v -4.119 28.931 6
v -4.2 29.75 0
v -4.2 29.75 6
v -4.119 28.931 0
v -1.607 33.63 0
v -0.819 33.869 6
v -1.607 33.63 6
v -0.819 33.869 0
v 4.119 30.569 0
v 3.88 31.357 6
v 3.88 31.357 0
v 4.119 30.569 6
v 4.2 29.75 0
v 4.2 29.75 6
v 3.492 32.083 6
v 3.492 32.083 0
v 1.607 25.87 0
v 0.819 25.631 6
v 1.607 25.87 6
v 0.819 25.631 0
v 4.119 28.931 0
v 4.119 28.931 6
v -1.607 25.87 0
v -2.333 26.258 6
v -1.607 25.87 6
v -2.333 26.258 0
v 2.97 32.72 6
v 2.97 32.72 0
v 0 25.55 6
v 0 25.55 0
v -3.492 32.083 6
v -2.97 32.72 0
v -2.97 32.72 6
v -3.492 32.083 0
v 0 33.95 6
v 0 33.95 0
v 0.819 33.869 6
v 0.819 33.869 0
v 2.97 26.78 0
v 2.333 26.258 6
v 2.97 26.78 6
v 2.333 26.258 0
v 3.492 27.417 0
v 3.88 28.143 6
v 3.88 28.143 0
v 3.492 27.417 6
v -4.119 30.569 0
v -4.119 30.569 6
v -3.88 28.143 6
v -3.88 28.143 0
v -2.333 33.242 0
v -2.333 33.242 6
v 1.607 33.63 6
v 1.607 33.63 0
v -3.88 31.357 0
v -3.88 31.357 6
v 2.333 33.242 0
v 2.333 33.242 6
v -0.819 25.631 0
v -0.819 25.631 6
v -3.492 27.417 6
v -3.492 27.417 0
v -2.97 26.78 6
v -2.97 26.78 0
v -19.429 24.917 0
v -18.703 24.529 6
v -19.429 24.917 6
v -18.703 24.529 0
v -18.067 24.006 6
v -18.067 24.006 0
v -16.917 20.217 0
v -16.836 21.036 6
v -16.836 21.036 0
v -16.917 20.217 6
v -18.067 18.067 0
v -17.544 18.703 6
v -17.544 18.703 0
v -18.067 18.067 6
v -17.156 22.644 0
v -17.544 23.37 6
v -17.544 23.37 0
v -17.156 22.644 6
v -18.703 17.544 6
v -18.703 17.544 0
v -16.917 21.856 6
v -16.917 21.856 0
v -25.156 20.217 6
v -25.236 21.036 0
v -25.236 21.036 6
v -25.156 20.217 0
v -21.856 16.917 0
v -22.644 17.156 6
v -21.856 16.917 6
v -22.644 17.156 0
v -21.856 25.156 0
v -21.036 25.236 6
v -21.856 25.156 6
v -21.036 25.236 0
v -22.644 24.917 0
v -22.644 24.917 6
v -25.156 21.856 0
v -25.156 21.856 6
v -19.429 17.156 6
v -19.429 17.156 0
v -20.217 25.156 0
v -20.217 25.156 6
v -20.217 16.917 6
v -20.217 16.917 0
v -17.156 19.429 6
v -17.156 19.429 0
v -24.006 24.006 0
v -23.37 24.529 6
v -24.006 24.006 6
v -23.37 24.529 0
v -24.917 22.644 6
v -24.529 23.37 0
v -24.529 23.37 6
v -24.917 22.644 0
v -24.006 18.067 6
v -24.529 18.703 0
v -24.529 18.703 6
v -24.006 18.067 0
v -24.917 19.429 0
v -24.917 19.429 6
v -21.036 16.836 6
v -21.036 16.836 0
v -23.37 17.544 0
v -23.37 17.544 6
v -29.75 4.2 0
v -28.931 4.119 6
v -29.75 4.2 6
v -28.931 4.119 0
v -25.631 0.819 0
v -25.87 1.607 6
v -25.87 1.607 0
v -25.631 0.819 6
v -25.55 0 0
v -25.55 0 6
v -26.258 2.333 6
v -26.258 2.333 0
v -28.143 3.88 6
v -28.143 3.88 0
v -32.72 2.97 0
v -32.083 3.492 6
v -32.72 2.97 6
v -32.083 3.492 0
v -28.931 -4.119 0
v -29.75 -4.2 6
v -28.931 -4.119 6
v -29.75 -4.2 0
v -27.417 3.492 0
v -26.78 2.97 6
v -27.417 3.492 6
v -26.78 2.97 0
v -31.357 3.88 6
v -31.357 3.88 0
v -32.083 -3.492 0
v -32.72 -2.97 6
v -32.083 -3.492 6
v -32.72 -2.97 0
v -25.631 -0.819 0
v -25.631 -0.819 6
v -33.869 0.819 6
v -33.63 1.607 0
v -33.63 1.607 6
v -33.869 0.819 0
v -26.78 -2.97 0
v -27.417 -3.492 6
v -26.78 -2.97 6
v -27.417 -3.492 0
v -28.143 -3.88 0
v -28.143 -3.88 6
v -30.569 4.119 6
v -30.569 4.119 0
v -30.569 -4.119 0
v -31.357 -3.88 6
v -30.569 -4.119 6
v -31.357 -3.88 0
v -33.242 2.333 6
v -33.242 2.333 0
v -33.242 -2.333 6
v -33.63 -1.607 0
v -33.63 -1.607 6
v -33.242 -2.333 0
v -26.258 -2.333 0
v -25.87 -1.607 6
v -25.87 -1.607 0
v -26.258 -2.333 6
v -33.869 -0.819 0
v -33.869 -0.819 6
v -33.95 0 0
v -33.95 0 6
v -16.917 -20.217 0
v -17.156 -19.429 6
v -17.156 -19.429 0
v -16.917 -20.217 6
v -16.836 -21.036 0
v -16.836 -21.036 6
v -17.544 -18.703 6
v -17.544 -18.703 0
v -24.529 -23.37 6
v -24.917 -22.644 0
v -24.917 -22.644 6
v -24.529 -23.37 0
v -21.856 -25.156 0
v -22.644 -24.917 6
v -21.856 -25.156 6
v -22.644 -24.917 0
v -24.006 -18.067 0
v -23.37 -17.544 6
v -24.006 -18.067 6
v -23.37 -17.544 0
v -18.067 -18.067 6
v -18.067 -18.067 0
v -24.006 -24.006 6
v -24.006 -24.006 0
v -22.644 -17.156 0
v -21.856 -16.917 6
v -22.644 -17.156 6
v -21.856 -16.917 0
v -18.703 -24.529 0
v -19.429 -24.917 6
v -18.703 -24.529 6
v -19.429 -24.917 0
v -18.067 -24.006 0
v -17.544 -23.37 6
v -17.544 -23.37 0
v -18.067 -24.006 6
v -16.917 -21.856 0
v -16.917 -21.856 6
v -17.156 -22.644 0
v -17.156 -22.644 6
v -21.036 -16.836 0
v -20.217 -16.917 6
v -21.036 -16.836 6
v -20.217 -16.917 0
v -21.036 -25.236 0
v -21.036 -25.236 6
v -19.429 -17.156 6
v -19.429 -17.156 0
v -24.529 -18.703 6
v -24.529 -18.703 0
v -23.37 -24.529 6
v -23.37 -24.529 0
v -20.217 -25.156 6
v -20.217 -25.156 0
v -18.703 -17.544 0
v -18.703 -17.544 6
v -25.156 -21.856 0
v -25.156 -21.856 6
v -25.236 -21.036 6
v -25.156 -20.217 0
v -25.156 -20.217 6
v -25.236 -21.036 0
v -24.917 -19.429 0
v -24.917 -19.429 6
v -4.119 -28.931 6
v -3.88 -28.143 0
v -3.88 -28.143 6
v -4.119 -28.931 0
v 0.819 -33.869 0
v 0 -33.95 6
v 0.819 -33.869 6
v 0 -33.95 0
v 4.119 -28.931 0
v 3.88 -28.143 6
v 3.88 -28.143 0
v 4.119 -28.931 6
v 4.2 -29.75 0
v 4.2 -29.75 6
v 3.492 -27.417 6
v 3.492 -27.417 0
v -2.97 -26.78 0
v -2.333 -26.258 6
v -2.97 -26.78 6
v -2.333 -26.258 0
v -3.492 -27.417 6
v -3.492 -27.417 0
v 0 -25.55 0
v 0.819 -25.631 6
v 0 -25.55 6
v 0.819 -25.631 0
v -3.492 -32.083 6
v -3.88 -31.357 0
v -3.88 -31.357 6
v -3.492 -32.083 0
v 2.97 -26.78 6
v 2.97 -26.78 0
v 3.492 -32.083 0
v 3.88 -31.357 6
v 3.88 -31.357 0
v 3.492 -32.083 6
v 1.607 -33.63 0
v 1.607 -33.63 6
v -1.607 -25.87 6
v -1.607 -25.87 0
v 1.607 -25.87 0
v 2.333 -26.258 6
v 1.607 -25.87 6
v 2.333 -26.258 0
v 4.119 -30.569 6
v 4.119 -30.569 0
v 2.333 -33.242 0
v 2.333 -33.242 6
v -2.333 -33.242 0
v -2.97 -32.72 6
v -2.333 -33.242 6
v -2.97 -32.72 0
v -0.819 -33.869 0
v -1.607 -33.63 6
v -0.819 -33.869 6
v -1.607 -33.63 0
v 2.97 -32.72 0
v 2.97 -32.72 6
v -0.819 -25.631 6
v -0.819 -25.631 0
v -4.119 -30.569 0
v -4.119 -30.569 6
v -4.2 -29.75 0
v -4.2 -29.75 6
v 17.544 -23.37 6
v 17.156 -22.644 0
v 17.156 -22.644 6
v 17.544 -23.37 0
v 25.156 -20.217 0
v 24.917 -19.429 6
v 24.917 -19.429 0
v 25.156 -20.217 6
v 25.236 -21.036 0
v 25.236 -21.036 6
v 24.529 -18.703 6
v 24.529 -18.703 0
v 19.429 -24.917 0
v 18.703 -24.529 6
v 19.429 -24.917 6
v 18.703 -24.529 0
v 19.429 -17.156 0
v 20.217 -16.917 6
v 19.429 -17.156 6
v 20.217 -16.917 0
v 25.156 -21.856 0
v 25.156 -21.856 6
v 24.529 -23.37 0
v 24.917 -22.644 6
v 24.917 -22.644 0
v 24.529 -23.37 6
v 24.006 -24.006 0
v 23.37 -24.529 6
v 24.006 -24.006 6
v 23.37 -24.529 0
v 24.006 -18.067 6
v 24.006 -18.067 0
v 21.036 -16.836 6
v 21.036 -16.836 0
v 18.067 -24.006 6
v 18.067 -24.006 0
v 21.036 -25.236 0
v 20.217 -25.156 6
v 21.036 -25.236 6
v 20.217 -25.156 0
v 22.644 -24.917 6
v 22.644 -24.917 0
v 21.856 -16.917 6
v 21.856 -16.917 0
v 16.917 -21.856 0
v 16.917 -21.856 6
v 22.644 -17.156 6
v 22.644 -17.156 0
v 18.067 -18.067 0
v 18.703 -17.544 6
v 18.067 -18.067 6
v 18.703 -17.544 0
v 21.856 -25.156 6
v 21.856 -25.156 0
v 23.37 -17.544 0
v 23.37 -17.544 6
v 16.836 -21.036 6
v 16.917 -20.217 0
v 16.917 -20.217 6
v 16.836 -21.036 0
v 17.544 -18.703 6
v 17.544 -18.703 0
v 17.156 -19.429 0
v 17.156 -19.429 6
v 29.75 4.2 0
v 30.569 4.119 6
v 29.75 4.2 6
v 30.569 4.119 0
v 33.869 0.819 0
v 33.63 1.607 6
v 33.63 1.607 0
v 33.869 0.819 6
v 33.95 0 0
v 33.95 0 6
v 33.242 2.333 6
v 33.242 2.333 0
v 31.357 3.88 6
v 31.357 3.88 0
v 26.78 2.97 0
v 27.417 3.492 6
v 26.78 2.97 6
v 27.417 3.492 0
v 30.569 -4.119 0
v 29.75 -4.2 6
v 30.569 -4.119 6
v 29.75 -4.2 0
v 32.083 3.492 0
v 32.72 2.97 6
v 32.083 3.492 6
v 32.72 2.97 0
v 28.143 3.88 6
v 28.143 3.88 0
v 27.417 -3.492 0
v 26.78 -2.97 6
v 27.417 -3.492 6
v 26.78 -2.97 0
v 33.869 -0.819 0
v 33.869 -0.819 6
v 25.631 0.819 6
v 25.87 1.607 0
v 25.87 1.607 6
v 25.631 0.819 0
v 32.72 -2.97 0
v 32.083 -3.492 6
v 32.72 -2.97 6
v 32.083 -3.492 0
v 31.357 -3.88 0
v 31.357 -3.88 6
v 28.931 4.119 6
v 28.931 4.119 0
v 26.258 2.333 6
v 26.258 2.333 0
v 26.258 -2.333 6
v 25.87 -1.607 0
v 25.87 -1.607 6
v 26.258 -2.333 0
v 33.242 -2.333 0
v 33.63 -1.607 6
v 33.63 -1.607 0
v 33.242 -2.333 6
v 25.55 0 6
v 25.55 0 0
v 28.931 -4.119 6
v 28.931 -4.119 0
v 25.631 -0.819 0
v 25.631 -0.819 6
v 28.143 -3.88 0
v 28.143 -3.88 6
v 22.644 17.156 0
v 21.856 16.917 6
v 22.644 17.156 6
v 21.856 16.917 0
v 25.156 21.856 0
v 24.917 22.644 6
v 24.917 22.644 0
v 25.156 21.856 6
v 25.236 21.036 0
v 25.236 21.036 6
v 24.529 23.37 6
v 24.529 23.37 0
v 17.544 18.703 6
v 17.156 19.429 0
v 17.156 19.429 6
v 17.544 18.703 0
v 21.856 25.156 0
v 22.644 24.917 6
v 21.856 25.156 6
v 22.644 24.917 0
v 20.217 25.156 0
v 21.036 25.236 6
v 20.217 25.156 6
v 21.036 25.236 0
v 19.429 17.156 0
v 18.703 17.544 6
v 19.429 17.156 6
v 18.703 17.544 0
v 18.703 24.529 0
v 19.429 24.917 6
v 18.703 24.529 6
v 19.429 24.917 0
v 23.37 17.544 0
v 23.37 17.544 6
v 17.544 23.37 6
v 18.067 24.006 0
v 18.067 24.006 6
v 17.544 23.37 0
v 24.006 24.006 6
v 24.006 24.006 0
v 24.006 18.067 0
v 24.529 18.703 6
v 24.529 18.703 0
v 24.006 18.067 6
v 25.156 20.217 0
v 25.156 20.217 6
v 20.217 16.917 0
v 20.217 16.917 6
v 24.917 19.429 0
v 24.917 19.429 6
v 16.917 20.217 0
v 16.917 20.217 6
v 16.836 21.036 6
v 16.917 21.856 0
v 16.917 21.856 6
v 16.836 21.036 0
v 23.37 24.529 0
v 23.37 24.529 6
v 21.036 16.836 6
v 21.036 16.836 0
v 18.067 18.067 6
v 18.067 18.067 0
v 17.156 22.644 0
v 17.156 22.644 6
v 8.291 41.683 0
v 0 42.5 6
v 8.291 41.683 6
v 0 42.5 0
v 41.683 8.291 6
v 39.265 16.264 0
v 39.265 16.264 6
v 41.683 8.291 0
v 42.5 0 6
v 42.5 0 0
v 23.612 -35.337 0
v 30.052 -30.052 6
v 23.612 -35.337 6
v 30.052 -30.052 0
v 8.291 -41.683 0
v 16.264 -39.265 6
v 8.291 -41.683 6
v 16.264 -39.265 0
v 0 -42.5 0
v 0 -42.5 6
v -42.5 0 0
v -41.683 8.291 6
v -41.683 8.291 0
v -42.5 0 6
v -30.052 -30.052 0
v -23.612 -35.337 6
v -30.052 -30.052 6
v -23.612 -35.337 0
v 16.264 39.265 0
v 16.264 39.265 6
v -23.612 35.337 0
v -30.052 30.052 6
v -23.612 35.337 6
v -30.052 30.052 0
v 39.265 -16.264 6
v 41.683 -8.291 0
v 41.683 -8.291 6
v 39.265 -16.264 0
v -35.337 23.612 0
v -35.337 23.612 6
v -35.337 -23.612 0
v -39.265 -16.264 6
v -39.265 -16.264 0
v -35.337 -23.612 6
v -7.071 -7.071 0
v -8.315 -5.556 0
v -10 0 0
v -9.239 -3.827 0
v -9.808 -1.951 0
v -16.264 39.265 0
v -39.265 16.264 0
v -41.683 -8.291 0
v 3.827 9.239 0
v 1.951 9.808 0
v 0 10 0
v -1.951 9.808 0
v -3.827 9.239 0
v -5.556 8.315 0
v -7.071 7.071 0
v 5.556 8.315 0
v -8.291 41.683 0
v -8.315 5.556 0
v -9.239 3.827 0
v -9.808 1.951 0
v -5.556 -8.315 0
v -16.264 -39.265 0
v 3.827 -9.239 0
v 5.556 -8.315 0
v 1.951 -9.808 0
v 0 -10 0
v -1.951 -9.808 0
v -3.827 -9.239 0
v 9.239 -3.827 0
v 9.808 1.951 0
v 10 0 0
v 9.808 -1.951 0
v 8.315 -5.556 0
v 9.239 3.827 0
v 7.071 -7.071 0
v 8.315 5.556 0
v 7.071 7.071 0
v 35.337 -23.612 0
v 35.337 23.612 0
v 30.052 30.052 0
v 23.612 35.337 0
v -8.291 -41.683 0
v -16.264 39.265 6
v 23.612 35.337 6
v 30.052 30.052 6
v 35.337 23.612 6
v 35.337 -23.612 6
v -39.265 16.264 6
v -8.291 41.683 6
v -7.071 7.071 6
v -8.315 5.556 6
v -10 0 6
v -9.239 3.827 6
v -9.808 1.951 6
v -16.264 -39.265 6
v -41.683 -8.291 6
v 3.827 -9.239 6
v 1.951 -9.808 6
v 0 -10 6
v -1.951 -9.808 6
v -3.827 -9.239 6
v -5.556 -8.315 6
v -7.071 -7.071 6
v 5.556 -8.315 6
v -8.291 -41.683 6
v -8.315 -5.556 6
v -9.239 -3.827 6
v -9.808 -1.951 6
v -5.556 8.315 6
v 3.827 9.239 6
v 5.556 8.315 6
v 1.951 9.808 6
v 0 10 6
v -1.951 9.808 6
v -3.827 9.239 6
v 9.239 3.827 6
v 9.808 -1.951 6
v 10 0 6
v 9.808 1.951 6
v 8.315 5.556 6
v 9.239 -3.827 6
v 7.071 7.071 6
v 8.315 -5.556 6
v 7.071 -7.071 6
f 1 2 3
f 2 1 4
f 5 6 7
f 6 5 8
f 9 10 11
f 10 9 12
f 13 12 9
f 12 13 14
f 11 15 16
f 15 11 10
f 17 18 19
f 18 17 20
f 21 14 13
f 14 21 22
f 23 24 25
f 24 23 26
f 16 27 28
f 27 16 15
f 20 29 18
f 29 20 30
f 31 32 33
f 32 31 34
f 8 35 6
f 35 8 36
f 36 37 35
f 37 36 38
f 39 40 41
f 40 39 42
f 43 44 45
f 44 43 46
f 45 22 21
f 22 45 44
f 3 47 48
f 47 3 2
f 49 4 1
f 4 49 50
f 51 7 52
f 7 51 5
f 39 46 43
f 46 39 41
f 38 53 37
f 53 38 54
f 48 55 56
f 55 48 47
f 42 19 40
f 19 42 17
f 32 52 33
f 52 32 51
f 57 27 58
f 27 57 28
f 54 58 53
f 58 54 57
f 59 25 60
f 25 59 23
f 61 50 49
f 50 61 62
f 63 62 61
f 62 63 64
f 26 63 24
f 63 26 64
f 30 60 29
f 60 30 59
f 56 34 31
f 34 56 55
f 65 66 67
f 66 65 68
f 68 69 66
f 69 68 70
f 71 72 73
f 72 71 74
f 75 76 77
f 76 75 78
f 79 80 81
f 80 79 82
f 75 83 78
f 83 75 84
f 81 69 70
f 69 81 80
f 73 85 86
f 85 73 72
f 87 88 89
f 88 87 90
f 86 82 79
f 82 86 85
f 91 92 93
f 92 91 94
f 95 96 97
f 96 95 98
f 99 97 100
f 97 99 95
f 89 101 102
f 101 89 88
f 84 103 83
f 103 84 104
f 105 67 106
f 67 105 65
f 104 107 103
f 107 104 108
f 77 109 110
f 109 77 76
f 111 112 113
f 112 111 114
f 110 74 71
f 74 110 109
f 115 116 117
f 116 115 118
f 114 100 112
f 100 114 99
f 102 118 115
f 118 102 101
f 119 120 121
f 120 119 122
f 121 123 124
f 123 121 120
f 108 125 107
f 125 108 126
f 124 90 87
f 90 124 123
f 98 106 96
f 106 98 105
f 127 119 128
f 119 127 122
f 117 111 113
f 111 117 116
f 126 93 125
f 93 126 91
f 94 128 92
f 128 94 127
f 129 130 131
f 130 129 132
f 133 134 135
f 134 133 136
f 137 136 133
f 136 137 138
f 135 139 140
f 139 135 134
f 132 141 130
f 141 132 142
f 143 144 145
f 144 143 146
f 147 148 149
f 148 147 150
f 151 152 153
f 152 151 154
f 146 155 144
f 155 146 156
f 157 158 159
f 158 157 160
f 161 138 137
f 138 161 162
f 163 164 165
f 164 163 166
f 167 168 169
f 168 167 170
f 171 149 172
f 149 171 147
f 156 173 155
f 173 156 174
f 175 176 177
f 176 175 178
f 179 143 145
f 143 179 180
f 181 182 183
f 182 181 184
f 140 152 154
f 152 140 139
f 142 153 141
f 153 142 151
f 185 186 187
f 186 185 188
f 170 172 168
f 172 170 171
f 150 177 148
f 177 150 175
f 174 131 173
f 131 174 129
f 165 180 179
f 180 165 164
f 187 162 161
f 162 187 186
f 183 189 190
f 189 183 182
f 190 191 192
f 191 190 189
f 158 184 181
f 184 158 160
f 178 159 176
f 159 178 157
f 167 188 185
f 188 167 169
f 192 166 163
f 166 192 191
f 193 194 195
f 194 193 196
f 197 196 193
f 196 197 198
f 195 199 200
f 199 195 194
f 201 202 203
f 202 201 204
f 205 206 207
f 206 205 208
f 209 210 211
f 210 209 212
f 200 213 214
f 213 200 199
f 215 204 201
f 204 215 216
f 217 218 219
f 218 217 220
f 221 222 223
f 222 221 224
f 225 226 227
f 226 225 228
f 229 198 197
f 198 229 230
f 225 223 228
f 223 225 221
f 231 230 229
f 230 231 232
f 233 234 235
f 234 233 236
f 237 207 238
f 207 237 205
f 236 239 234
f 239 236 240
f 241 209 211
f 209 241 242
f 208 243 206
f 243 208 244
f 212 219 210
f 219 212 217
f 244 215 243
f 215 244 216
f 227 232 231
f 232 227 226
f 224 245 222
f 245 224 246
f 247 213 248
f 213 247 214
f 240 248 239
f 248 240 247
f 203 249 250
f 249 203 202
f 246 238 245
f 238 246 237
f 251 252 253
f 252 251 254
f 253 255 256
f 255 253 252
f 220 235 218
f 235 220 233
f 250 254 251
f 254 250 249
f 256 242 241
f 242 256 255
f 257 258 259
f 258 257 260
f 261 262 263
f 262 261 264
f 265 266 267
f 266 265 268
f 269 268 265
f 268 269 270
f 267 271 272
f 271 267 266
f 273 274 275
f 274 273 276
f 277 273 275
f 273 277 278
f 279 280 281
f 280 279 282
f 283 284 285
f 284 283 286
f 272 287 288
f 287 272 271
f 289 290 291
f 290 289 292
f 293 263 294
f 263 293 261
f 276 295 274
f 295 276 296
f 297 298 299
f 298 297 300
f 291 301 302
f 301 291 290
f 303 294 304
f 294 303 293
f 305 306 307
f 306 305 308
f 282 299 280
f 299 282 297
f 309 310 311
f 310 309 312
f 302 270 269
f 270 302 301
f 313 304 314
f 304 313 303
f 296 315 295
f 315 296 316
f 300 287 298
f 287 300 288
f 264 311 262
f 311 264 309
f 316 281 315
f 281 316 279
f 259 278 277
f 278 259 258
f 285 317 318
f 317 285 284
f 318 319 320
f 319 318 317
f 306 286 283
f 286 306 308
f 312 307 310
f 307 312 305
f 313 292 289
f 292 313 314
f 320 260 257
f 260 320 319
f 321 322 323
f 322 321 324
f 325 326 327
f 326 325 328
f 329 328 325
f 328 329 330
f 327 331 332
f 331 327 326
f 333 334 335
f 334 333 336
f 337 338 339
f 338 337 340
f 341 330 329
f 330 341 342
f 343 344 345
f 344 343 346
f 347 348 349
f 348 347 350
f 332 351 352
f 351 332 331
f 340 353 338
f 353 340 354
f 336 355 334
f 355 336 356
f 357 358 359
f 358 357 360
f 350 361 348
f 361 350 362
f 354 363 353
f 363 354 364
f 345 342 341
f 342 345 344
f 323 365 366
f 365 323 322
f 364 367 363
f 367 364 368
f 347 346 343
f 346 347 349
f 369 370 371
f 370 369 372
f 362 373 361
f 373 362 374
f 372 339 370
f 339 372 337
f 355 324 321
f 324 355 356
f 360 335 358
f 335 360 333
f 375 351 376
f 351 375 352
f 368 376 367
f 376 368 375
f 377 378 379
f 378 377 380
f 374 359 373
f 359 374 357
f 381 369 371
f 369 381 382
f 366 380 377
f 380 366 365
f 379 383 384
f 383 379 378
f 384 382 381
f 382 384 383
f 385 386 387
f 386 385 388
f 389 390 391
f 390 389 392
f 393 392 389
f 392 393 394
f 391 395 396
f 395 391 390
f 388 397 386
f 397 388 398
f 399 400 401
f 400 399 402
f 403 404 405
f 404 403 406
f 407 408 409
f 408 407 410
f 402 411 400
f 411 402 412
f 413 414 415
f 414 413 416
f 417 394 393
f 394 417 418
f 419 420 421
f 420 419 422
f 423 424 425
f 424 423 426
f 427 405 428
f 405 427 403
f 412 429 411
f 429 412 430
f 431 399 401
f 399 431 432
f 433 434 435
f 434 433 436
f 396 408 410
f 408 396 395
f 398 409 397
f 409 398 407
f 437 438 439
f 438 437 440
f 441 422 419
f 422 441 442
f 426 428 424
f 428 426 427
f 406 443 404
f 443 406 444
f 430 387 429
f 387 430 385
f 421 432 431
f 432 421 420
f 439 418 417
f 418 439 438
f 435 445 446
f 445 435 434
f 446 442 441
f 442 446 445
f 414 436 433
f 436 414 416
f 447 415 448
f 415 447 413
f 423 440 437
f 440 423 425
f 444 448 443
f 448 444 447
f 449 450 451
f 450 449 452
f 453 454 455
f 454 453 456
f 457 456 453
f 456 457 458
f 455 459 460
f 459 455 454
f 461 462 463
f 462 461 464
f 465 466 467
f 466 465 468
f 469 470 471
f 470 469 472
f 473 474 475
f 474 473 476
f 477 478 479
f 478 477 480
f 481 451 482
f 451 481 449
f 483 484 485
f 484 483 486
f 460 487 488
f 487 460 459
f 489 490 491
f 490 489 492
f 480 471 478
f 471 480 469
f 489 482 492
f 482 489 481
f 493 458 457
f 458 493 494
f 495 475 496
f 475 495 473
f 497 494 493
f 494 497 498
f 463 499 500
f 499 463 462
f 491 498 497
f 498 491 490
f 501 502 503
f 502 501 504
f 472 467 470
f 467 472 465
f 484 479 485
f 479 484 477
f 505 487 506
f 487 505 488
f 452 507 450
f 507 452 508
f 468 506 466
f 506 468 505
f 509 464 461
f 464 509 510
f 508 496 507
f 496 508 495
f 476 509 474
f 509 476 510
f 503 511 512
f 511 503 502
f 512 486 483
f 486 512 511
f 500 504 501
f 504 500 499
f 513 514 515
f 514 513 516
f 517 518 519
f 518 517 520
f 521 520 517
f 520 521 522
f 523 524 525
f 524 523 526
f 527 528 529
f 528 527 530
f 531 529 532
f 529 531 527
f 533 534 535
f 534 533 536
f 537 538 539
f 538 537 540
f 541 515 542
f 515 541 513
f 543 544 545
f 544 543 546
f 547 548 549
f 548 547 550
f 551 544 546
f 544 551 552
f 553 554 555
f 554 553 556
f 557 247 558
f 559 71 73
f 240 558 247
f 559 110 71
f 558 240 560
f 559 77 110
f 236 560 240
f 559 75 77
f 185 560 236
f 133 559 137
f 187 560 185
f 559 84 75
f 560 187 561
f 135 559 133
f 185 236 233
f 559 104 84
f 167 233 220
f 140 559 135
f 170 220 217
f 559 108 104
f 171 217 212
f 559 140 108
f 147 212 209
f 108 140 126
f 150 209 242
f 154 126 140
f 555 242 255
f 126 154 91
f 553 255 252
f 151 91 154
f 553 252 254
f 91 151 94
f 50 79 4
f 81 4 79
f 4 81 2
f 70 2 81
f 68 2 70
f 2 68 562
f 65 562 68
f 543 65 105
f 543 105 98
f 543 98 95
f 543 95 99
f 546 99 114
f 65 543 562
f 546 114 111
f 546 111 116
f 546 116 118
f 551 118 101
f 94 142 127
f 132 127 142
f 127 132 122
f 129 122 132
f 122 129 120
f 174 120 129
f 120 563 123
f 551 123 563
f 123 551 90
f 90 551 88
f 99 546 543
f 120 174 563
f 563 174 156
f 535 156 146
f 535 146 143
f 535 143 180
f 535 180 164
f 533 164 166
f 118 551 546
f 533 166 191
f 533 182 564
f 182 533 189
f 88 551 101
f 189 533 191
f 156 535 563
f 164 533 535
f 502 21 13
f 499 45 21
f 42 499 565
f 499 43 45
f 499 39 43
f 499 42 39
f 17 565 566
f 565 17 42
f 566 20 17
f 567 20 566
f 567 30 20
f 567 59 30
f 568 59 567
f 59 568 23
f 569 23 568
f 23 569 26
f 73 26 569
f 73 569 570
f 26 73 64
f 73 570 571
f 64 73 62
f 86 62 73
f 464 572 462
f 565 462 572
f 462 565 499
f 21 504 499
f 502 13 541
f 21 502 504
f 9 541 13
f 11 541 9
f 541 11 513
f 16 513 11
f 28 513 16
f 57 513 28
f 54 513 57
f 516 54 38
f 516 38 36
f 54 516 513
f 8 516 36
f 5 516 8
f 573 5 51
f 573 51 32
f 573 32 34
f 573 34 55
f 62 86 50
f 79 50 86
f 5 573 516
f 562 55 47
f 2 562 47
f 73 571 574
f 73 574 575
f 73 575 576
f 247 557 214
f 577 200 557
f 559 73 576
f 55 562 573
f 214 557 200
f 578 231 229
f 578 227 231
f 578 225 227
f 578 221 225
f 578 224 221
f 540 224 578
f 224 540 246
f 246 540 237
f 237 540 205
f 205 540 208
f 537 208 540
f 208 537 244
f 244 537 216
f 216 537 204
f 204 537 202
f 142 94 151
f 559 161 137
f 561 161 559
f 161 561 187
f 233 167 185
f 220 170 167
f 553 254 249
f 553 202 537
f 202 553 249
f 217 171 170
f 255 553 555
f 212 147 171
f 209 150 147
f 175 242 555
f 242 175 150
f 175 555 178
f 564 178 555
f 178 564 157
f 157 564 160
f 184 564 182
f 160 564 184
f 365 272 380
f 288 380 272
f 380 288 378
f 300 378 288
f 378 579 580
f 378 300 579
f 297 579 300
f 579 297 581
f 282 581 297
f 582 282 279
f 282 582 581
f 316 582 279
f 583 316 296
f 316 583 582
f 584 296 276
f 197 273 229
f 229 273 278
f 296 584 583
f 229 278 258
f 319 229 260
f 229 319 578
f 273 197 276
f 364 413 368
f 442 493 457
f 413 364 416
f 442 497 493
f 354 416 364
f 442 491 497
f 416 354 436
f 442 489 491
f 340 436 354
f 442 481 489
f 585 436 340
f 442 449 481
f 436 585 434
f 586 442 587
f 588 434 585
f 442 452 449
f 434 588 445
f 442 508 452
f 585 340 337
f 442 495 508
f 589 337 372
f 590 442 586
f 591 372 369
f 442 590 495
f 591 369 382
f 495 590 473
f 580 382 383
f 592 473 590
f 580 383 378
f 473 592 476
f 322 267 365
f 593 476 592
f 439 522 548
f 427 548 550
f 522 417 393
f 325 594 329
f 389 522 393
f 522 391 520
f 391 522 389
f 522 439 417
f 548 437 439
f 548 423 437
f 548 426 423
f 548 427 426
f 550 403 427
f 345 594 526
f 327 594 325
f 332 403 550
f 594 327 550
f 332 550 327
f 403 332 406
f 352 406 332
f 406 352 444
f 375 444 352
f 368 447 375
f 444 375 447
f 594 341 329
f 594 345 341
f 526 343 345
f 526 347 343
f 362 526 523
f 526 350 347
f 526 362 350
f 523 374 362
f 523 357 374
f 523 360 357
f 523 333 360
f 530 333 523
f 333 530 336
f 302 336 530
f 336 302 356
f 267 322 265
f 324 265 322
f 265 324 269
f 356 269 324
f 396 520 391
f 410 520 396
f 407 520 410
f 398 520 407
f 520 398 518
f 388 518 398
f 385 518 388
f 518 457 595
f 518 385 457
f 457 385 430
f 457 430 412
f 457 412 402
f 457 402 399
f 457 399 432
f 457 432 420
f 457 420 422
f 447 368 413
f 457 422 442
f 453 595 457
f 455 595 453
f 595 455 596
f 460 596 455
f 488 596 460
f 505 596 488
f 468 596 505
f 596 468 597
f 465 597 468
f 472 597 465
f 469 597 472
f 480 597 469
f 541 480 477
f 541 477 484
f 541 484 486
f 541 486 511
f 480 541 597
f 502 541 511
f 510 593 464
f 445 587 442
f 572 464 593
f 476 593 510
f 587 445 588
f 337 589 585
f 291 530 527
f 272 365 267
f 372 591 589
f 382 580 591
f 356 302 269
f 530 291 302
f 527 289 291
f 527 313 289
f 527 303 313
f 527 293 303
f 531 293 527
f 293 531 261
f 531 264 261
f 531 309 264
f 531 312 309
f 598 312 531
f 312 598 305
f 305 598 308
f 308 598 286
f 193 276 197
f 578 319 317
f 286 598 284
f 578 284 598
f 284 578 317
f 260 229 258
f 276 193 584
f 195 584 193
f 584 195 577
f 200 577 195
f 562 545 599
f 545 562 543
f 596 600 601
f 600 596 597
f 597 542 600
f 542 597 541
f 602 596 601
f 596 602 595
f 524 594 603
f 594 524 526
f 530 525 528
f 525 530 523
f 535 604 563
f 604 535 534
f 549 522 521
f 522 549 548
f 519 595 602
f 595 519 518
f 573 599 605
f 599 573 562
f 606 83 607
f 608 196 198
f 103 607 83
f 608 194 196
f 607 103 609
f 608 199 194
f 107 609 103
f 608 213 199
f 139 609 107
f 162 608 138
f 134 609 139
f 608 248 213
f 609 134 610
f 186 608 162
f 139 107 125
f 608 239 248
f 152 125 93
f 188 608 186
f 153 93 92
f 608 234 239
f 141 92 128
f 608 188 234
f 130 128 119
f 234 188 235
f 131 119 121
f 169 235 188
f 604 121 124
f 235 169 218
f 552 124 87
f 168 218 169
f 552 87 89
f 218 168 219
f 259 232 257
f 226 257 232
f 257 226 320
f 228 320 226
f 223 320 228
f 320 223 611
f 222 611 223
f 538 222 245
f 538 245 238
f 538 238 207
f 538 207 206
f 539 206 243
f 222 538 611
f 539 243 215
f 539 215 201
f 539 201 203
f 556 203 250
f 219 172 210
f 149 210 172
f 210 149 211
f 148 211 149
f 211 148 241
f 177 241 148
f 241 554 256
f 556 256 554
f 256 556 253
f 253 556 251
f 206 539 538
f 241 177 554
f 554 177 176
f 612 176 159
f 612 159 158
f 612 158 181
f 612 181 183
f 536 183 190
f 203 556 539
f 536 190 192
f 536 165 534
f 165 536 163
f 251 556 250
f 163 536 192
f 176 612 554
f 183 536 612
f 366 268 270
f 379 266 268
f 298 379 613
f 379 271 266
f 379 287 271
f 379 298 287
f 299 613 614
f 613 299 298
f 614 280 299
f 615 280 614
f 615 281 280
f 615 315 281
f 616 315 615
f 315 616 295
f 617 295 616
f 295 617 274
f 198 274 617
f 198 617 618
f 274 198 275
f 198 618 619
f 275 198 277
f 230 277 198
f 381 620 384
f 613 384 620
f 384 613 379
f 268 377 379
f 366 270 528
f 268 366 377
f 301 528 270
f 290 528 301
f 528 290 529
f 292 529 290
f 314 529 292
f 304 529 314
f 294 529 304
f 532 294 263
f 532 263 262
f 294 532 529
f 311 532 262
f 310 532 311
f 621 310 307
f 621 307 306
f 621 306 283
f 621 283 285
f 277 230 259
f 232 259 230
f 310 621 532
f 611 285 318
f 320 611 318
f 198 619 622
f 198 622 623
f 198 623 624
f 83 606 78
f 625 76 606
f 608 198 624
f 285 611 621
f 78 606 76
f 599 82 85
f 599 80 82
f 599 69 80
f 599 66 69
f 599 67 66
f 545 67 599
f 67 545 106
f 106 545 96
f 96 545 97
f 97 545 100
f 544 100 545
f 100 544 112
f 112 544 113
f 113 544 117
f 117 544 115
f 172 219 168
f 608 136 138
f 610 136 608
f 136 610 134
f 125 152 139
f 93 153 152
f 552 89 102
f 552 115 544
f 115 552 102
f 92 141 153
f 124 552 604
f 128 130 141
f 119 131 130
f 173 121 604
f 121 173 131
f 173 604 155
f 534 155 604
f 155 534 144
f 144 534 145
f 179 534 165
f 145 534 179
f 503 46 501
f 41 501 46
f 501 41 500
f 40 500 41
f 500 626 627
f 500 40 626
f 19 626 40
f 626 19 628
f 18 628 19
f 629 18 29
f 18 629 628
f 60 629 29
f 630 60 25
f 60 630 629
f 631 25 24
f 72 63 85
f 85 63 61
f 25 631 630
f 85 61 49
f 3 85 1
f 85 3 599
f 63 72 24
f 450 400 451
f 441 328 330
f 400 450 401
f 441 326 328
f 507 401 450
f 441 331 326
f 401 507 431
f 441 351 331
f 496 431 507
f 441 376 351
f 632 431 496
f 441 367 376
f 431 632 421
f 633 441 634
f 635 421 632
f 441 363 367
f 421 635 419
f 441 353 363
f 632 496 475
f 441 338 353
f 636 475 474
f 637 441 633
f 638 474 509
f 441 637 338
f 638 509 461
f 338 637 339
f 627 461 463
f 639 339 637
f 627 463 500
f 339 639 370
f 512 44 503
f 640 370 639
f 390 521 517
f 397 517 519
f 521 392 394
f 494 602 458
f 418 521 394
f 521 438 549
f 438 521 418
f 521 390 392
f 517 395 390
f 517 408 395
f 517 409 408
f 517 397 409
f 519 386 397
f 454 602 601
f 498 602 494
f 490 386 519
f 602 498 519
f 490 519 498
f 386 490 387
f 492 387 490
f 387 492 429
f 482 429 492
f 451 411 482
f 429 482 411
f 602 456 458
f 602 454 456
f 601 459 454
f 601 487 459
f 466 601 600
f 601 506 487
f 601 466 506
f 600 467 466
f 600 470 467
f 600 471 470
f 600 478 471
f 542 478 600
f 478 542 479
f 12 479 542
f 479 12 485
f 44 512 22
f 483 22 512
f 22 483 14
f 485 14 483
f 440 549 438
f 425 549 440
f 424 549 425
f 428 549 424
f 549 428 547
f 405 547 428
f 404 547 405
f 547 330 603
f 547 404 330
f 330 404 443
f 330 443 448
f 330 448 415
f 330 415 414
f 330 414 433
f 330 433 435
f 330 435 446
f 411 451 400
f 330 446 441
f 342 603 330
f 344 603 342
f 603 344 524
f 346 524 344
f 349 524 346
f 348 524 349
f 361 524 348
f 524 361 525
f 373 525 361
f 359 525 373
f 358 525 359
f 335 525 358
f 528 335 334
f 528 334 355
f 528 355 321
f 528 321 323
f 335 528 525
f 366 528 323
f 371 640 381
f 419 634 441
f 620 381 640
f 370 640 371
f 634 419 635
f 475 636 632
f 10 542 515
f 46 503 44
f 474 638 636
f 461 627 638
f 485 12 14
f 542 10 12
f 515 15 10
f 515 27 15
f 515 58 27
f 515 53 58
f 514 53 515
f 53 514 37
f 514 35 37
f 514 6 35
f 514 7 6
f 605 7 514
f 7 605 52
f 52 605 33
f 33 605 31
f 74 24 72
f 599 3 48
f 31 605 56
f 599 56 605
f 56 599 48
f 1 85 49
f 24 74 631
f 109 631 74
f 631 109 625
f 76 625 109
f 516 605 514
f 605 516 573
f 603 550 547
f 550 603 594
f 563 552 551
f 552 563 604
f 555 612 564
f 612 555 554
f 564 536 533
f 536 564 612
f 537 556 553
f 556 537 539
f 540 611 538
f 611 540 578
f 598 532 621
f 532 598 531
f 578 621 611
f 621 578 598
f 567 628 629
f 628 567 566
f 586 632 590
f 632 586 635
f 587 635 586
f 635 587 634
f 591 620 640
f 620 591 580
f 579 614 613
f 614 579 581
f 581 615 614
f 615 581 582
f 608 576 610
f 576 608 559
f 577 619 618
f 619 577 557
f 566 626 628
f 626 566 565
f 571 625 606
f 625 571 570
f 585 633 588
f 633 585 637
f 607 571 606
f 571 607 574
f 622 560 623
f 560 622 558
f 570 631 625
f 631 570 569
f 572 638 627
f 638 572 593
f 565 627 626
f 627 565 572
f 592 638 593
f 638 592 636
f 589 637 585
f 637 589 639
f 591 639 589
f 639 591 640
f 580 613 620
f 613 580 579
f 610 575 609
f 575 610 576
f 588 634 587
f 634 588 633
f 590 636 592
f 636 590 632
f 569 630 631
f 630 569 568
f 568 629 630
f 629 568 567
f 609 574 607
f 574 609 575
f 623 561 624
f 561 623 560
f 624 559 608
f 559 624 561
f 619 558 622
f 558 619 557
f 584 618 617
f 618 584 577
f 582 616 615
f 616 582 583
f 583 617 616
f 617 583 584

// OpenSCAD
$fn = 32;

// ----------------------------------------------------------------------
// Flange Ø85 x 6
// 8 holes on a Ø59.5 bolt circle, bolted joints
// ----------------------------------------------------------------------

// --- parameters (mm) ---
flange_d = 85;   // outside diameter of the flange
thickness = 6;   // flange thickness
holes = 8;       // number of bolt holes
pcd = 59.5;      // bolt circle diameter
start_deg = 90;  // angle of the first hole, from +X
hole_d = 8.4;    // bolt hole diameter
bore_d = 20;     // central through bore
hub_d = 28;      // hub outside diameter
hub_h = 0;       // hub height above the flange face (0 = no hub)

// --- derived feature positions (mm) ---
height = thickness + hub_h;  // = 6   overall height of the part
pcd_r = pcd / 2;             // = 29.75   bolt circle radius
hole_step = 360 / holes;     // = 45   angular pitch
feature_centers = [
  [pcd_r * cos(start_deg + 0 * hole_step), pcd_r * sin(start_deg + 0 * hole_step)],
  [pcd_r * cos(start_deg + 1 * hole_step), pcd_r * sin(start_deg + 1 * hole_step)],
  [pcd_r * cos(start_deg + 2 * hole_step), pcd_r * sin(start_deg + 2 * hole_step)],
  [pcd_r * cos(start_deg + 3 * hole_step), pcd_r * sin(start_deg + 3 * hole_step)],
  [pcd_r * cos(start_deg + 4 * hole_step), pcd_r * sin(start_deg + 4 * hole_step)],
  [pcd_r * cos(start_deg + 5 * hole_step), pcd_r * sin(start_deg + 5 * hole_step)],
  [pcd_r * cos(start_deg + 6 * hole_step), pcd_r * sin(start_deg + 6 * hole_step)],
  [pcd_r * cos(start_deg + 7 * hole_step), pcd_r * sin(start_deg + 7 * hole_step)]
];   // bolt hole centres on the pitch circle

// flange disc, every hole and the bore cut straight through
difference() {
  union() {
    cylinder(d = flange_d, h = thickness);
  }
  translate([0, 0, -1]) cylinder(d = bore_d, h = height + 2);  // bore, through
  for (centre = feature_centers)
    translate([centre[0], centre[1], -1]) cylinder(d = hole_d, h = thickness + 2);
}
